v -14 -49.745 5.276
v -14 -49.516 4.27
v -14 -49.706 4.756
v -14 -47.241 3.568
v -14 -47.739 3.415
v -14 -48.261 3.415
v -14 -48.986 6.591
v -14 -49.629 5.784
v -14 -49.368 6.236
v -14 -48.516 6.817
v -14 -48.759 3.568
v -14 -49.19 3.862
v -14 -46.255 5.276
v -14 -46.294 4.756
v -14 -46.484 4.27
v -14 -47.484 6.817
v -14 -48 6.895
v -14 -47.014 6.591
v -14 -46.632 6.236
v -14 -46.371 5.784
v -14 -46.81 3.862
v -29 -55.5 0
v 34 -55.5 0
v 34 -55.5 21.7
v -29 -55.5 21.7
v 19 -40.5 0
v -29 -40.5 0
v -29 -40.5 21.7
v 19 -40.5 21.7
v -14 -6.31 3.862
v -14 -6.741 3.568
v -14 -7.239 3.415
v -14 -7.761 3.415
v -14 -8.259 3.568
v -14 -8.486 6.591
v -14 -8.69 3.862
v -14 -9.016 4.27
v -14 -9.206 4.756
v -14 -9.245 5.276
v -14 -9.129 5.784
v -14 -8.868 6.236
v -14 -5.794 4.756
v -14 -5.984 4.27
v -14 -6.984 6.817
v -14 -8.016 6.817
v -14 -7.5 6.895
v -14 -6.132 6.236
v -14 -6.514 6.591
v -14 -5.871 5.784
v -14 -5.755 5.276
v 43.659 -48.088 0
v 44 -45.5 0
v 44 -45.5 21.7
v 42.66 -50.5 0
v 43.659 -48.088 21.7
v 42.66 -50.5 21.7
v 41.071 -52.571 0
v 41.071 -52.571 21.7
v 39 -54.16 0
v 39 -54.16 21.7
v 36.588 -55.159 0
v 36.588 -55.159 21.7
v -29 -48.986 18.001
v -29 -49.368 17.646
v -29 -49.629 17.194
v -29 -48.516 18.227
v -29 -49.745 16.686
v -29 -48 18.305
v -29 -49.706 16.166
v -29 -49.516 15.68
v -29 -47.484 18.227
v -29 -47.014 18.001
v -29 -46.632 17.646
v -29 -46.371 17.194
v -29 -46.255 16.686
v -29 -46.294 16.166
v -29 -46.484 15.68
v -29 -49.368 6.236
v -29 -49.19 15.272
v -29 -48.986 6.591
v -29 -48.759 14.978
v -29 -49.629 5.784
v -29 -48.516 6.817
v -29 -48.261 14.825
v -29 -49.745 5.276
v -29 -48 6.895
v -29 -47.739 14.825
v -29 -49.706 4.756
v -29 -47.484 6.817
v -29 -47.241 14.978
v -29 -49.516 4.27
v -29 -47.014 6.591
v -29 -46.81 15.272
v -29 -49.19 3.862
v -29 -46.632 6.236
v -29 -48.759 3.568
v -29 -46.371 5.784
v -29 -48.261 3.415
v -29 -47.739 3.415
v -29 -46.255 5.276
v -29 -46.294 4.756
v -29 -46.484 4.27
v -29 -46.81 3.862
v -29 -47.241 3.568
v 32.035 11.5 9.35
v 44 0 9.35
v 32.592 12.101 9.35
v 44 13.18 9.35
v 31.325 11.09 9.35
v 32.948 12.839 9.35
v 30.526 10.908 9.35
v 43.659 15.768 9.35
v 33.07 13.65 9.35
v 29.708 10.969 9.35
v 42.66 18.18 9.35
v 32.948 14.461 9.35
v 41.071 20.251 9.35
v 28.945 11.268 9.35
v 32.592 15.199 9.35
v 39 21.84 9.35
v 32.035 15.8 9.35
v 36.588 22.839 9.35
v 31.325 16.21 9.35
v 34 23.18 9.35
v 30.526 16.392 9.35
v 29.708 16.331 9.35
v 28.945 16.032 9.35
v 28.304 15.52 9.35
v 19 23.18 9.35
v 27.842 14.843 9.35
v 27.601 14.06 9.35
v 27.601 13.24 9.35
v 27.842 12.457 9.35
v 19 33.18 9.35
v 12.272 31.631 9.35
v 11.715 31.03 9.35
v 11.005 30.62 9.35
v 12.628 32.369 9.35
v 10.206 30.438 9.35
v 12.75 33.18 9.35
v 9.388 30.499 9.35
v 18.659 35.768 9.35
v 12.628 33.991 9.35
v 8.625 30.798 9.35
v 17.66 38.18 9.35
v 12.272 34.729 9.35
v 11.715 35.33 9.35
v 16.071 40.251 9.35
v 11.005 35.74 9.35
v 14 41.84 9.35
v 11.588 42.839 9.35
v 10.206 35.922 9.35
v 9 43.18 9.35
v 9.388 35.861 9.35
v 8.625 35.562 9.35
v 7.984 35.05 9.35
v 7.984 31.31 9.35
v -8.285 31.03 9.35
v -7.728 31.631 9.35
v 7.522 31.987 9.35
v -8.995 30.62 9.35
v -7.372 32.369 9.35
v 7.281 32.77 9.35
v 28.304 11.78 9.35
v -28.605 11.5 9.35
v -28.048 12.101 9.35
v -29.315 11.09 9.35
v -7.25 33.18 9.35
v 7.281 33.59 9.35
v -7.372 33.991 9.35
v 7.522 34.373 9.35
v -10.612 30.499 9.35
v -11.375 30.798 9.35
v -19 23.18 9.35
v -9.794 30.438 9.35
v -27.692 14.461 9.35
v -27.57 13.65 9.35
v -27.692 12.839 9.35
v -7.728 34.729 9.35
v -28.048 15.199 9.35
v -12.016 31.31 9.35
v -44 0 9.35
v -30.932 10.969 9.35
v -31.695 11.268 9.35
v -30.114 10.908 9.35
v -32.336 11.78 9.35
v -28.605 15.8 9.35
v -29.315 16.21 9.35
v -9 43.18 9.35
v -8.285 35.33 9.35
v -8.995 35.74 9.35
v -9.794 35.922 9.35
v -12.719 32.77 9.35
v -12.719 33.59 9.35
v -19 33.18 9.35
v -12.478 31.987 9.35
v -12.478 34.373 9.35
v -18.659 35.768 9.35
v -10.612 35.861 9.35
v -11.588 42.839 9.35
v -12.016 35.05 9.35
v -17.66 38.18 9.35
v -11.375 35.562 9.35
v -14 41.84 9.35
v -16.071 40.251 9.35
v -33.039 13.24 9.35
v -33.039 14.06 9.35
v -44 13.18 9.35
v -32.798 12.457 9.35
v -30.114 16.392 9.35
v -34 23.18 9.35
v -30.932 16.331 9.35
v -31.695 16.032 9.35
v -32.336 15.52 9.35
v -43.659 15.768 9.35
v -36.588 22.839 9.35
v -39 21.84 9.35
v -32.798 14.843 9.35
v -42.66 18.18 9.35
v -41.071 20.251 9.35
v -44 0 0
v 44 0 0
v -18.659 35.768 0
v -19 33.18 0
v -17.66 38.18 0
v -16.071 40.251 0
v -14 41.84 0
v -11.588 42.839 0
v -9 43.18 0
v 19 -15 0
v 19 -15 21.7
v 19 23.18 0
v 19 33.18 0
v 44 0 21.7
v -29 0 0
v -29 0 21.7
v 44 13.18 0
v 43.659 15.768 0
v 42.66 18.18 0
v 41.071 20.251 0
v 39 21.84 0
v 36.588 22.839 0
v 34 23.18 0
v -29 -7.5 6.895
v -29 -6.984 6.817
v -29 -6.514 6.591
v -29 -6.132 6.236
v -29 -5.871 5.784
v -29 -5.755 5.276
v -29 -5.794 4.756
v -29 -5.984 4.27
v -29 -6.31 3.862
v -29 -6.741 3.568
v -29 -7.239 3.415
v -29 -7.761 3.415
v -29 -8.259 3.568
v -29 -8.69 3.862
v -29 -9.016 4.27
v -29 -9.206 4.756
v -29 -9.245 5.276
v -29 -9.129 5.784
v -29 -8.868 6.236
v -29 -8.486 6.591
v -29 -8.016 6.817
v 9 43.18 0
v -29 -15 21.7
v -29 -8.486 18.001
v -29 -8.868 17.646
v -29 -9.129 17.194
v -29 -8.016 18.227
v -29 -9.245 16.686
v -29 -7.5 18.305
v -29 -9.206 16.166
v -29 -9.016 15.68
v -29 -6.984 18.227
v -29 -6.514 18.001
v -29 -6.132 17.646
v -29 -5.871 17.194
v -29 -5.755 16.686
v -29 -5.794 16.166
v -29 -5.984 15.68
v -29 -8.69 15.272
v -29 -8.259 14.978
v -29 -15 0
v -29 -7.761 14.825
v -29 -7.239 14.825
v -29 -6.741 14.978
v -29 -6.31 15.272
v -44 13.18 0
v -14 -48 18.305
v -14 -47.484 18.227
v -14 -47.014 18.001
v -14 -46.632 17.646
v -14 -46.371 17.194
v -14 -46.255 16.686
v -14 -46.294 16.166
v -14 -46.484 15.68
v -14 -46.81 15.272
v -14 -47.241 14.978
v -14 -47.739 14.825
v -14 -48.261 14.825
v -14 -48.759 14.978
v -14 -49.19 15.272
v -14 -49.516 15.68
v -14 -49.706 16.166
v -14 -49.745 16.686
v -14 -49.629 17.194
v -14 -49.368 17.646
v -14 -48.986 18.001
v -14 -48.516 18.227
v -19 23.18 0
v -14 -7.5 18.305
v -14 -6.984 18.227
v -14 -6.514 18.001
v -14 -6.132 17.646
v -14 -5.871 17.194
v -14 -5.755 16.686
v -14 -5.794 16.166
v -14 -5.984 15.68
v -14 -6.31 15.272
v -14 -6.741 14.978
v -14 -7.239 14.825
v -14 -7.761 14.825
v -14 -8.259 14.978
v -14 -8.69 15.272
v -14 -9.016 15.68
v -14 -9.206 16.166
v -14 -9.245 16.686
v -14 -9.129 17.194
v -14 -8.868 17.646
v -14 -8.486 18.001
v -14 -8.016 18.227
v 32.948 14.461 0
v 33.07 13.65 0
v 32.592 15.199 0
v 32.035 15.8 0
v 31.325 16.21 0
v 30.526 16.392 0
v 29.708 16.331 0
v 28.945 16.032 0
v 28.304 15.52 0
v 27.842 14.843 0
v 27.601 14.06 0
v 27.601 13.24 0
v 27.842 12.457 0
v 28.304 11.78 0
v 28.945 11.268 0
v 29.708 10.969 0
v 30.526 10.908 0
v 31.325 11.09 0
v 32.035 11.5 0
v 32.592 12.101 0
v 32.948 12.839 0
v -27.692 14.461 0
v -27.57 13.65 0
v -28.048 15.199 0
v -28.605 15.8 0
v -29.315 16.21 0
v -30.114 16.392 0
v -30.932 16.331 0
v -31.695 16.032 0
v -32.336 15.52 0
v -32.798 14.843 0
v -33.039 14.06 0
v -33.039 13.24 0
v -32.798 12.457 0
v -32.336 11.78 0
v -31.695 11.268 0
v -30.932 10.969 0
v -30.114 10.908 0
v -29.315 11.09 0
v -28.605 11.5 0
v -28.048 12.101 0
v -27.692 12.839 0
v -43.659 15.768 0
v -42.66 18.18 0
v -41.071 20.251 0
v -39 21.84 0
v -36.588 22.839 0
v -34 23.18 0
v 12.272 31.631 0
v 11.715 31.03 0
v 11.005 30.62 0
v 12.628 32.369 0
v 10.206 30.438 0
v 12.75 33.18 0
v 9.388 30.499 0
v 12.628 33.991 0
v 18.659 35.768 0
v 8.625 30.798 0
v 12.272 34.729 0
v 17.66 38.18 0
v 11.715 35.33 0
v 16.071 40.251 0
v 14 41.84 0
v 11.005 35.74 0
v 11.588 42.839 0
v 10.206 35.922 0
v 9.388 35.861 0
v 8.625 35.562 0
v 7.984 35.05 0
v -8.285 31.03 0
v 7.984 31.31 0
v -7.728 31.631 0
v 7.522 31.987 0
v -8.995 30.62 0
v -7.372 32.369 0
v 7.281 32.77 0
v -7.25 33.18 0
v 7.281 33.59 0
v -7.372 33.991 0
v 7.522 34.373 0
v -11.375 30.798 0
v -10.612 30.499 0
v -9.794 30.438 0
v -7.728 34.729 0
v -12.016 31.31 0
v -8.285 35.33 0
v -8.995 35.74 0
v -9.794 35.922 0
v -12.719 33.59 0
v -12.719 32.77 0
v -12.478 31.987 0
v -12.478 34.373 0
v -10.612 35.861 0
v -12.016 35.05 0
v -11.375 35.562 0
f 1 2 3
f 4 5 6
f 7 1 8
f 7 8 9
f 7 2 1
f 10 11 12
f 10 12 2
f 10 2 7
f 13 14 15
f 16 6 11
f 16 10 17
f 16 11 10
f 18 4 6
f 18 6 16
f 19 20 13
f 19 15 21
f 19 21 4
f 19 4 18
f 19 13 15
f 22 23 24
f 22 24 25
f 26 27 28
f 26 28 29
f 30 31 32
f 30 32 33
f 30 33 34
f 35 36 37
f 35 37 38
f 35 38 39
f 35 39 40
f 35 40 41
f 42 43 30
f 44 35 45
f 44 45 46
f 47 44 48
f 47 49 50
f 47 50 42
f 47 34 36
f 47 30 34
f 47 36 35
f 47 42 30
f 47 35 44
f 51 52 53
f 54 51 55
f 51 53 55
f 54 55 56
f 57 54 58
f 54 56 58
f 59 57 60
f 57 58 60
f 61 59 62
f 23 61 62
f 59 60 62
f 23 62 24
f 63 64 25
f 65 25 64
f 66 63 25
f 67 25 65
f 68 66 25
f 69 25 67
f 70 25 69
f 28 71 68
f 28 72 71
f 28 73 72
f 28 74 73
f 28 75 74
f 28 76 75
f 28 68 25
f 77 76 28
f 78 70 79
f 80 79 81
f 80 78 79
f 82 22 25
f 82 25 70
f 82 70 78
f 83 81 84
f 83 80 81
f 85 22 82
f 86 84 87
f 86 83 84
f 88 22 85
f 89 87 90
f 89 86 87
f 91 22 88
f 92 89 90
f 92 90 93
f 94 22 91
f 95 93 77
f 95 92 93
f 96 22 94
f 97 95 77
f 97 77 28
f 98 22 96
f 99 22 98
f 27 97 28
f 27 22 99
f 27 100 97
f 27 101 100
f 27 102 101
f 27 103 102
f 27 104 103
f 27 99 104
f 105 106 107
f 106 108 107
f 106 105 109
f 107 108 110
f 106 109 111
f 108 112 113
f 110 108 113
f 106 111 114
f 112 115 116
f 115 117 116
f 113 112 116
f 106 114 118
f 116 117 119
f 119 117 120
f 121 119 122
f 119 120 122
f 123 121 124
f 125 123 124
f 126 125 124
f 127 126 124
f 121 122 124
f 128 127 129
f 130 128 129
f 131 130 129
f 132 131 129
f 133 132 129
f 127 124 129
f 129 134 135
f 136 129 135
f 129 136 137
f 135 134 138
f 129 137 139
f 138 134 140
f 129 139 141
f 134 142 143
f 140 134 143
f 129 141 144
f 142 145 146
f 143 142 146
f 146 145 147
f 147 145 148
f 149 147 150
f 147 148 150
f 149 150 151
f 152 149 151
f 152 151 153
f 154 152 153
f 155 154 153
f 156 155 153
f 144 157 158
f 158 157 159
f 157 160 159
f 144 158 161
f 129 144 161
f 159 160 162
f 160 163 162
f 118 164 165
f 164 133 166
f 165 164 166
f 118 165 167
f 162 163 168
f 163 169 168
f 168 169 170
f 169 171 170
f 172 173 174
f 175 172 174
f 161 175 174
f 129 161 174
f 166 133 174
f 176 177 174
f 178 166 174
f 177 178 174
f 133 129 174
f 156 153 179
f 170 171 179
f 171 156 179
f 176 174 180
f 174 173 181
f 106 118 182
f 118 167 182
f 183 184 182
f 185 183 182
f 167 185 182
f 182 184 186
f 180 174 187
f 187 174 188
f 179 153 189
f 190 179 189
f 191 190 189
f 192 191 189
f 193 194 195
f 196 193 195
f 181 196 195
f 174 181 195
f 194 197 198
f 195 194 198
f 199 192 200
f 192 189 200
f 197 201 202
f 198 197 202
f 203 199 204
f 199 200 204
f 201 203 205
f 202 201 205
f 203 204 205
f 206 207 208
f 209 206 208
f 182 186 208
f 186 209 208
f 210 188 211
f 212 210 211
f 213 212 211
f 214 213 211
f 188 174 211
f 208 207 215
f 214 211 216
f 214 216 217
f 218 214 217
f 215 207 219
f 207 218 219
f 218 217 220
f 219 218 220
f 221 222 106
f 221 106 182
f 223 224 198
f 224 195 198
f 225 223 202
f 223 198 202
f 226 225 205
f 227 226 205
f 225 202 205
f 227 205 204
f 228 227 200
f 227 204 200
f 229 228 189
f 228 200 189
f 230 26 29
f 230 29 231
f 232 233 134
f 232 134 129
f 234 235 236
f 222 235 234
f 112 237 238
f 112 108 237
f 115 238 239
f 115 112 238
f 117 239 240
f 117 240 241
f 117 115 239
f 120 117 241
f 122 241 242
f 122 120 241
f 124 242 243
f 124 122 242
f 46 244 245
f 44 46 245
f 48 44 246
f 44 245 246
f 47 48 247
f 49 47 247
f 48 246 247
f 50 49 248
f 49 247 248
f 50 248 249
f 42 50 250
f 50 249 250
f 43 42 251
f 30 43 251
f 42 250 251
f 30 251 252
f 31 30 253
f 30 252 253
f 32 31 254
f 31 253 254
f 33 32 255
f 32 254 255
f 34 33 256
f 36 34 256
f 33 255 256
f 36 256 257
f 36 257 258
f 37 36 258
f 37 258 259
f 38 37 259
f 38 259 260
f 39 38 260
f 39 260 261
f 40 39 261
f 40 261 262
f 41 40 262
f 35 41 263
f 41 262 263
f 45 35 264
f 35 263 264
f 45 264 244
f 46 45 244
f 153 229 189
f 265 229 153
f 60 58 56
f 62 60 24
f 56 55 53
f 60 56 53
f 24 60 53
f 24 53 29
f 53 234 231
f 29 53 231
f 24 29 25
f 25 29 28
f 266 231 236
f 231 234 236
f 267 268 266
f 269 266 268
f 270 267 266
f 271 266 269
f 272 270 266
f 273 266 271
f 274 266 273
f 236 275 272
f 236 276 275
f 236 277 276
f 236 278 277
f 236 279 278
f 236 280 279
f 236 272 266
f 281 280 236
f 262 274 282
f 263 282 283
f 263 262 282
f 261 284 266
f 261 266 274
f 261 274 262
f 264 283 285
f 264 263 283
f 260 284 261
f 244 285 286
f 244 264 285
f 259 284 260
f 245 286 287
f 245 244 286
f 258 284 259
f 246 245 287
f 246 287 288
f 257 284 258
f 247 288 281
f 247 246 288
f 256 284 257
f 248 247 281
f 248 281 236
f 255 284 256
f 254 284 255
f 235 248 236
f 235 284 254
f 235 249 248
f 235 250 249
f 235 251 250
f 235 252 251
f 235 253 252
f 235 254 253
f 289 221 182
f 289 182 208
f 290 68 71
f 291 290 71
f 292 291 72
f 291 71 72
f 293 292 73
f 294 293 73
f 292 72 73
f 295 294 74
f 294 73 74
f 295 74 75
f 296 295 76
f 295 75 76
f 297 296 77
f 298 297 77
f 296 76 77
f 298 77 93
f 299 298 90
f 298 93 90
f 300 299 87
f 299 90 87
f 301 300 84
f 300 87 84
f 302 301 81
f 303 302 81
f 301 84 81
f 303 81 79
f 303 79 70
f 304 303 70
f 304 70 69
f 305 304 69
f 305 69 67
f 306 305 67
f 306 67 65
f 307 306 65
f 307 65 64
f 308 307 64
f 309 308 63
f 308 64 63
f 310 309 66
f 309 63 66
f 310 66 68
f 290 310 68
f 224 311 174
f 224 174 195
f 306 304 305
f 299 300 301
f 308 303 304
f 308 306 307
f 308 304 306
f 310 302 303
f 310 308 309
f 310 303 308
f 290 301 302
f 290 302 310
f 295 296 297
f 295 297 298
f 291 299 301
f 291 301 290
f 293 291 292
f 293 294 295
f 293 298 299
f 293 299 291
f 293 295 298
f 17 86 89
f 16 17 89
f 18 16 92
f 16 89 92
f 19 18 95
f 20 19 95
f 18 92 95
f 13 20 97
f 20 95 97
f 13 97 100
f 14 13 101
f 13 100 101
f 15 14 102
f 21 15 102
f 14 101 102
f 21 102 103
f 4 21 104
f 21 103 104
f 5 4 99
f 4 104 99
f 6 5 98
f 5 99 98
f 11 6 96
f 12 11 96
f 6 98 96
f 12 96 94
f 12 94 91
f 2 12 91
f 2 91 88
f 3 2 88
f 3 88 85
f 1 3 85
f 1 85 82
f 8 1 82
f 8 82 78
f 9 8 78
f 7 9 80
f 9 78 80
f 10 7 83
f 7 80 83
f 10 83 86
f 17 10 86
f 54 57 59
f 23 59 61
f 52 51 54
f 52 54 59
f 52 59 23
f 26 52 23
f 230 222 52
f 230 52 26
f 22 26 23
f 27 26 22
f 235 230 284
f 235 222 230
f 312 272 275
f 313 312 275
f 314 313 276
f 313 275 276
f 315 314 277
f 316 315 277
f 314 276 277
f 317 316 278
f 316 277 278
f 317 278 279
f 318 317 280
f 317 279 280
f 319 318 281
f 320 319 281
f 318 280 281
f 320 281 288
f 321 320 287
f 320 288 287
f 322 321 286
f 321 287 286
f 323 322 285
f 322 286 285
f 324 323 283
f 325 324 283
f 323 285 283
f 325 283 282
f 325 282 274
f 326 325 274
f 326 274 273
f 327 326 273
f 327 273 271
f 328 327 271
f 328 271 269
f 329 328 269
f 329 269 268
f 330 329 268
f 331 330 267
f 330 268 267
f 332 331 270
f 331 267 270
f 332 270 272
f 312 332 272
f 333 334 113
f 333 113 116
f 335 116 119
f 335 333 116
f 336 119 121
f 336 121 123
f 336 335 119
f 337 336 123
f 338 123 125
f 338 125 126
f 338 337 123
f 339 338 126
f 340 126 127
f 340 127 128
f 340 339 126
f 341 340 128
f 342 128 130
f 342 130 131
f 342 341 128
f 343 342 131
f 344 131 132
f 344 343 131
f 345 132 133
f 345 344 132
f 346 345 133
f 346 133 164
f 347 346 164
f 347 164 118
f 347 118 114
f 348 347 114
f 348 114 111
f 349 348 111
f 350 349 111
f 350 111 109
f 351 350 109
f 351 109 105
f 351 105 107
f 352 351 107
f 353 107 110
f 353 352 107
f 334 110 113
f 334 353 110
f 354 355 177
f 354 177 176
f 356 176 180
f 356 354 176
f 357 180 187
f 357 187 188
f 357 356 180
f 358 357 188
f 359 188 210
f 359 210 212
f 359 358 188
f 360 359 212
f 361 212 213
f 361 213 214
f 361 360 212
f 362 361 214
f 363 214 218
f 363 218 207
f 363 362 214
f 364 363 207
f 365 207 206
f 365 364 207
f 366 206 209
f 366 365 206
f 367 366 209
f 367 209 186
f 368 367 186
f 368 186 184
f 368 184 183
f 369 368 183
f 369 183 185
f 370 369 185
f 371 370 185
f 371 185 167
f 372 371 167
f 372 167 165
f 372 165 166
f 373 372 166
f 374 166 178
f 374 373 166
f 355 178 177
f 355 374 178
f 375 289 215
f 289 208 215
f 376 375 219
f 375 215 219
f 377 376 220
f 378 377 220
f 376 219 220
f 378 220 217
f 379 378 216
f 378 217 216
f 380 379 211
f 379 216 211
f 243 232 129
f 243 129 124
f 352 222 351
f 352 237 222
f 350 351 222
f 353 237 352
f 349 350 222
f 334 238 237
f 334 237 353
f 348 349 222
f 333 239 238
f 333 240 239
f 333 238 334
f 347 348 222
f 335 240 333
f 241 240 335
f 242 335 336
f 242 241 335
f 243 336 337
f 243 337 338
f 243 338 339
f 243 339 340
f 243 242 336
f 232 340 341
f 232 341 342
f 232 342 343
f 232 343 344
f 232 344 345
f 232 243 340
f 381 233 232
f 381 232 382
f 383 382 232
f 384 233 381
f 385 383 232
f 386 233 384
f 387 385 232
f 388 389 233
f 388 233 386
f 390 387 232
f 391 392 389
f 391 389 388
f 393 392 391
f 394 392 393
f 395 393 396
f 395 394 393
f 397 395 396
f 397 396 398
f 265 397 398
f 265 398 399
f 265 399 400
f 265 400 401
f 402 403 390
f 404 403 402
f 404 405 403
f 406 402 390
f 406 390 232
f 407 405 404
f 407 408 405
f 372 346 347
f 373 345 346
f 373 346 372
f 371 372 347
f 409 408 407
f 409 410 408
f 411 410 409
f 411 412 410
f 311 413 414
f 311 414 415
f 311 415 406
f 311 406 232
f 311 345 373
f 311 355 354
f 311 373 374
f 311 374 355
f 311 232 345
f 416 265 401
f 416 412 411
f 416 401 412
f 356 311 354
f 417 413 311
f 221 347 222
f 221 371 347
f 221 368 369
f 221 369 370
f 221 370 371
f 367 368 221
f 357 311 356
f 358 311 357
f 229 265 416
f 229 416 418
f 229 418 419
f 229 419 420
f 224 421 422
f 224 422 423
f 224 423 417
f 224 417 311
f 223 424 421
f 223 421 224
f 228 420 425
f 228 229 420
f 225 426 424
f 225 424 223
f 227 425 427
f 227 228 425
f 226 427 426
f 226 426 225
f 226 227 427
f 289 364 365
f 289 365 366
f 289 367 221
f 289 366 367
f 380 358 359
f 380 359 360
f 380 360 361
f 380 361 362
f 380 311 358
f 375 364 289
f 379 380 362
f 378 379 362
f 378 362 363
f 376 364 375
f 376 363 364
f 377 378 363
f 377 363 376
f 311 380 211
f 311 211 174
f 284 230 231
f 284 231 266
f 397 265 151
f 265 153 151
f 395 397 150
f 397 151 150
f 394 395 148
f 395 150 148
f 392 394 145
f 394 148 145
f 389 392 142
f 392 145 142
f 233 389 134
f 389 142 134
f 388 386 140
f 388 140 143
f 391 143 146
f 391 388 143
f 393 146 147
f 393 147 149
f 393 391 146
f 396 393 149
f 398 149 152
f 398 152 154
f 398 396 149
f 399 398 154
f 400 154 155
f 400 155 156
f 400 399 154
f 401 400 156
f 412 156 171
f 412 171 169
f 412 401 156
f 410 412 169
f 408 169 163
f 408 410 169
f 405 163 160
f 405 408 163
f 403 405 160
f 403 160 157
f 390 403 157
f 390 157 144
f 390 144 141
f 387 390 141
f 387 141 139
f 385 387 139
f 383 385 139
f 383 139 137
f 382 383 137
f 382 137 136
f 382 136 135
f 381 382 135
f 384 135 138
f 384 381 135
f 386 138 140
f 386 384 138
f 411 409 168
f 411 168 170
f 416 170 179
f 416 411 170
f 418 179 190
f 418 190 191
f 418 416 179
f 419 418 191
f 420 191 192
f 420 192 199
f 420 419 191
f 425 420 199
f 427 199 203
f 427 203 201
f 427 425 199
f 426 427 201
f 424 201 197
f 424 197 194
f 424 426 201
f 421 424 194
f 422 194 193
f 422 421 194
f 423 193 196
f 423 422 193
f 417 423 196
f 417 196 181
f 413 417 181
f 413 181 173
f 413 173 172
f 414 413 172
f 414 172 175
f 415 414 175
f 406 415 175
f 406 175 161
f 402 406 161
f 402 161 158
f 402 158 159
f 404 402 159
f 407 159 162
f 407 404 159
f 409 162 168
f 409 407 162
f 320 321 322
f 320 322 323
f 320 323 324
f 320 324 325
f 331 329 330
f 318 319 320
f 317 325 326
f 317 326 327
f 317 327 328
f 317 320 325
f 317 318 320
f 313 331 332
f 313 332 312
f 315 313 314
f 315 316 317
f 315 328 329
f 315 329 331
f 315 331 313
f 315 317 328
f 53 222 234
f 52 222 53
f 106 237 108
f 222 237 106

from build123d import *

# Parameters (mm, degrees)
SKETCH1_R           = 2.75
BOSS_EXTRUDE1_DEPTH = 9.35
BOSS_EXTRUDE2_DEPTH = 21.7
SKETCH3_R           = 1.75
CUT_EXTRUDE2_DEPTH  = 15
FILLET1_R           = 10
FILLET2_R           = 10


with BuildPart() as part:
    # Sketch1 → Boss-Extrude1 (new body)
    with BuildSketch(Plane.XY):
        Polygon((-44, 0), (-44, 23.18), (-19, 23.18), (-19, 43.18), (19, 43.18), (19, 23.18), (44, 23.18), (44, 0), align=None)
        with Locations((10, 33.18)):
            Circle(SKETCH1_R, mode=Mode.SUBTRACT)
        with Locations((30.32, 13.65)):
            Circle(SKETCH1_R, mode=Mode.SUBTRACT)
        with Locations((-30.32, 13.65)):
            Circle(SKETCH1_R, mode=Mode.SUBTRACT)
        with Locations((-10, 33.18)):
            Circle(SKETCH1_R, mode=Mode.SUBTRACT)
    extrude(amount=BOSS_EXTRUDE1_DEPTH)

    # Fillet1
    fillet1_edges = [part.edges().sort_by_distance(p)[0] for p in [
        (-44, 23.18, 4.675),
        (-19, 43.18, 4.675),
        (19, 43.18, 4.675),
        (44, 23.18, 4.675),
    ]]
    fillet(fillet1_edges, radius=FILLET1_R)


with BuildPart() as body_2:
    # Sketch2 → Boss-Extrude2 (new body)
    with BuildSketch(Plane(origin=(0, 0, 0), x_dir=(-1, 0, 0), z_dir=(0, 0, -1))):
        Polygon((-44, 0), (-44, -55.5), (29, -55.5), (29, -40.5), (-19, -40.5), (-19, -15), (29, -15), (29, 0), align=None)
    extrude(amount=-BOSS_EXTRUDE2_DEPTH)

    # Sketch3 → Cut-Extrude2 (cut)
    with BuildSketch(Plane.ZY.offset(29)):
        with Locations((5.145, -7.5)):
            Circle(SKETCH3_R)
        with Locations((16.555, -7.5)):
            Circle(SKETCH3_R)
        with Locations((5.145, -48)):
            Circle(SKETCH3_R)
        with Locations((16.555, -48)):
            Circle(SKETCH3_R)
    extrude(amount=-CUT_EXTRUDE2_DEPTH, mode=Mode.SUBTRACT)

    # Fillet2
    fillet2_edges = [body_2.edges().sort_by_distance(p)[0] for p in [
        (44, -55.5, 10.85),
    ]]
    fillet(fillet2_edges, radius=FILLET2_R)


solid = Compound([part.part, body_2.part])
